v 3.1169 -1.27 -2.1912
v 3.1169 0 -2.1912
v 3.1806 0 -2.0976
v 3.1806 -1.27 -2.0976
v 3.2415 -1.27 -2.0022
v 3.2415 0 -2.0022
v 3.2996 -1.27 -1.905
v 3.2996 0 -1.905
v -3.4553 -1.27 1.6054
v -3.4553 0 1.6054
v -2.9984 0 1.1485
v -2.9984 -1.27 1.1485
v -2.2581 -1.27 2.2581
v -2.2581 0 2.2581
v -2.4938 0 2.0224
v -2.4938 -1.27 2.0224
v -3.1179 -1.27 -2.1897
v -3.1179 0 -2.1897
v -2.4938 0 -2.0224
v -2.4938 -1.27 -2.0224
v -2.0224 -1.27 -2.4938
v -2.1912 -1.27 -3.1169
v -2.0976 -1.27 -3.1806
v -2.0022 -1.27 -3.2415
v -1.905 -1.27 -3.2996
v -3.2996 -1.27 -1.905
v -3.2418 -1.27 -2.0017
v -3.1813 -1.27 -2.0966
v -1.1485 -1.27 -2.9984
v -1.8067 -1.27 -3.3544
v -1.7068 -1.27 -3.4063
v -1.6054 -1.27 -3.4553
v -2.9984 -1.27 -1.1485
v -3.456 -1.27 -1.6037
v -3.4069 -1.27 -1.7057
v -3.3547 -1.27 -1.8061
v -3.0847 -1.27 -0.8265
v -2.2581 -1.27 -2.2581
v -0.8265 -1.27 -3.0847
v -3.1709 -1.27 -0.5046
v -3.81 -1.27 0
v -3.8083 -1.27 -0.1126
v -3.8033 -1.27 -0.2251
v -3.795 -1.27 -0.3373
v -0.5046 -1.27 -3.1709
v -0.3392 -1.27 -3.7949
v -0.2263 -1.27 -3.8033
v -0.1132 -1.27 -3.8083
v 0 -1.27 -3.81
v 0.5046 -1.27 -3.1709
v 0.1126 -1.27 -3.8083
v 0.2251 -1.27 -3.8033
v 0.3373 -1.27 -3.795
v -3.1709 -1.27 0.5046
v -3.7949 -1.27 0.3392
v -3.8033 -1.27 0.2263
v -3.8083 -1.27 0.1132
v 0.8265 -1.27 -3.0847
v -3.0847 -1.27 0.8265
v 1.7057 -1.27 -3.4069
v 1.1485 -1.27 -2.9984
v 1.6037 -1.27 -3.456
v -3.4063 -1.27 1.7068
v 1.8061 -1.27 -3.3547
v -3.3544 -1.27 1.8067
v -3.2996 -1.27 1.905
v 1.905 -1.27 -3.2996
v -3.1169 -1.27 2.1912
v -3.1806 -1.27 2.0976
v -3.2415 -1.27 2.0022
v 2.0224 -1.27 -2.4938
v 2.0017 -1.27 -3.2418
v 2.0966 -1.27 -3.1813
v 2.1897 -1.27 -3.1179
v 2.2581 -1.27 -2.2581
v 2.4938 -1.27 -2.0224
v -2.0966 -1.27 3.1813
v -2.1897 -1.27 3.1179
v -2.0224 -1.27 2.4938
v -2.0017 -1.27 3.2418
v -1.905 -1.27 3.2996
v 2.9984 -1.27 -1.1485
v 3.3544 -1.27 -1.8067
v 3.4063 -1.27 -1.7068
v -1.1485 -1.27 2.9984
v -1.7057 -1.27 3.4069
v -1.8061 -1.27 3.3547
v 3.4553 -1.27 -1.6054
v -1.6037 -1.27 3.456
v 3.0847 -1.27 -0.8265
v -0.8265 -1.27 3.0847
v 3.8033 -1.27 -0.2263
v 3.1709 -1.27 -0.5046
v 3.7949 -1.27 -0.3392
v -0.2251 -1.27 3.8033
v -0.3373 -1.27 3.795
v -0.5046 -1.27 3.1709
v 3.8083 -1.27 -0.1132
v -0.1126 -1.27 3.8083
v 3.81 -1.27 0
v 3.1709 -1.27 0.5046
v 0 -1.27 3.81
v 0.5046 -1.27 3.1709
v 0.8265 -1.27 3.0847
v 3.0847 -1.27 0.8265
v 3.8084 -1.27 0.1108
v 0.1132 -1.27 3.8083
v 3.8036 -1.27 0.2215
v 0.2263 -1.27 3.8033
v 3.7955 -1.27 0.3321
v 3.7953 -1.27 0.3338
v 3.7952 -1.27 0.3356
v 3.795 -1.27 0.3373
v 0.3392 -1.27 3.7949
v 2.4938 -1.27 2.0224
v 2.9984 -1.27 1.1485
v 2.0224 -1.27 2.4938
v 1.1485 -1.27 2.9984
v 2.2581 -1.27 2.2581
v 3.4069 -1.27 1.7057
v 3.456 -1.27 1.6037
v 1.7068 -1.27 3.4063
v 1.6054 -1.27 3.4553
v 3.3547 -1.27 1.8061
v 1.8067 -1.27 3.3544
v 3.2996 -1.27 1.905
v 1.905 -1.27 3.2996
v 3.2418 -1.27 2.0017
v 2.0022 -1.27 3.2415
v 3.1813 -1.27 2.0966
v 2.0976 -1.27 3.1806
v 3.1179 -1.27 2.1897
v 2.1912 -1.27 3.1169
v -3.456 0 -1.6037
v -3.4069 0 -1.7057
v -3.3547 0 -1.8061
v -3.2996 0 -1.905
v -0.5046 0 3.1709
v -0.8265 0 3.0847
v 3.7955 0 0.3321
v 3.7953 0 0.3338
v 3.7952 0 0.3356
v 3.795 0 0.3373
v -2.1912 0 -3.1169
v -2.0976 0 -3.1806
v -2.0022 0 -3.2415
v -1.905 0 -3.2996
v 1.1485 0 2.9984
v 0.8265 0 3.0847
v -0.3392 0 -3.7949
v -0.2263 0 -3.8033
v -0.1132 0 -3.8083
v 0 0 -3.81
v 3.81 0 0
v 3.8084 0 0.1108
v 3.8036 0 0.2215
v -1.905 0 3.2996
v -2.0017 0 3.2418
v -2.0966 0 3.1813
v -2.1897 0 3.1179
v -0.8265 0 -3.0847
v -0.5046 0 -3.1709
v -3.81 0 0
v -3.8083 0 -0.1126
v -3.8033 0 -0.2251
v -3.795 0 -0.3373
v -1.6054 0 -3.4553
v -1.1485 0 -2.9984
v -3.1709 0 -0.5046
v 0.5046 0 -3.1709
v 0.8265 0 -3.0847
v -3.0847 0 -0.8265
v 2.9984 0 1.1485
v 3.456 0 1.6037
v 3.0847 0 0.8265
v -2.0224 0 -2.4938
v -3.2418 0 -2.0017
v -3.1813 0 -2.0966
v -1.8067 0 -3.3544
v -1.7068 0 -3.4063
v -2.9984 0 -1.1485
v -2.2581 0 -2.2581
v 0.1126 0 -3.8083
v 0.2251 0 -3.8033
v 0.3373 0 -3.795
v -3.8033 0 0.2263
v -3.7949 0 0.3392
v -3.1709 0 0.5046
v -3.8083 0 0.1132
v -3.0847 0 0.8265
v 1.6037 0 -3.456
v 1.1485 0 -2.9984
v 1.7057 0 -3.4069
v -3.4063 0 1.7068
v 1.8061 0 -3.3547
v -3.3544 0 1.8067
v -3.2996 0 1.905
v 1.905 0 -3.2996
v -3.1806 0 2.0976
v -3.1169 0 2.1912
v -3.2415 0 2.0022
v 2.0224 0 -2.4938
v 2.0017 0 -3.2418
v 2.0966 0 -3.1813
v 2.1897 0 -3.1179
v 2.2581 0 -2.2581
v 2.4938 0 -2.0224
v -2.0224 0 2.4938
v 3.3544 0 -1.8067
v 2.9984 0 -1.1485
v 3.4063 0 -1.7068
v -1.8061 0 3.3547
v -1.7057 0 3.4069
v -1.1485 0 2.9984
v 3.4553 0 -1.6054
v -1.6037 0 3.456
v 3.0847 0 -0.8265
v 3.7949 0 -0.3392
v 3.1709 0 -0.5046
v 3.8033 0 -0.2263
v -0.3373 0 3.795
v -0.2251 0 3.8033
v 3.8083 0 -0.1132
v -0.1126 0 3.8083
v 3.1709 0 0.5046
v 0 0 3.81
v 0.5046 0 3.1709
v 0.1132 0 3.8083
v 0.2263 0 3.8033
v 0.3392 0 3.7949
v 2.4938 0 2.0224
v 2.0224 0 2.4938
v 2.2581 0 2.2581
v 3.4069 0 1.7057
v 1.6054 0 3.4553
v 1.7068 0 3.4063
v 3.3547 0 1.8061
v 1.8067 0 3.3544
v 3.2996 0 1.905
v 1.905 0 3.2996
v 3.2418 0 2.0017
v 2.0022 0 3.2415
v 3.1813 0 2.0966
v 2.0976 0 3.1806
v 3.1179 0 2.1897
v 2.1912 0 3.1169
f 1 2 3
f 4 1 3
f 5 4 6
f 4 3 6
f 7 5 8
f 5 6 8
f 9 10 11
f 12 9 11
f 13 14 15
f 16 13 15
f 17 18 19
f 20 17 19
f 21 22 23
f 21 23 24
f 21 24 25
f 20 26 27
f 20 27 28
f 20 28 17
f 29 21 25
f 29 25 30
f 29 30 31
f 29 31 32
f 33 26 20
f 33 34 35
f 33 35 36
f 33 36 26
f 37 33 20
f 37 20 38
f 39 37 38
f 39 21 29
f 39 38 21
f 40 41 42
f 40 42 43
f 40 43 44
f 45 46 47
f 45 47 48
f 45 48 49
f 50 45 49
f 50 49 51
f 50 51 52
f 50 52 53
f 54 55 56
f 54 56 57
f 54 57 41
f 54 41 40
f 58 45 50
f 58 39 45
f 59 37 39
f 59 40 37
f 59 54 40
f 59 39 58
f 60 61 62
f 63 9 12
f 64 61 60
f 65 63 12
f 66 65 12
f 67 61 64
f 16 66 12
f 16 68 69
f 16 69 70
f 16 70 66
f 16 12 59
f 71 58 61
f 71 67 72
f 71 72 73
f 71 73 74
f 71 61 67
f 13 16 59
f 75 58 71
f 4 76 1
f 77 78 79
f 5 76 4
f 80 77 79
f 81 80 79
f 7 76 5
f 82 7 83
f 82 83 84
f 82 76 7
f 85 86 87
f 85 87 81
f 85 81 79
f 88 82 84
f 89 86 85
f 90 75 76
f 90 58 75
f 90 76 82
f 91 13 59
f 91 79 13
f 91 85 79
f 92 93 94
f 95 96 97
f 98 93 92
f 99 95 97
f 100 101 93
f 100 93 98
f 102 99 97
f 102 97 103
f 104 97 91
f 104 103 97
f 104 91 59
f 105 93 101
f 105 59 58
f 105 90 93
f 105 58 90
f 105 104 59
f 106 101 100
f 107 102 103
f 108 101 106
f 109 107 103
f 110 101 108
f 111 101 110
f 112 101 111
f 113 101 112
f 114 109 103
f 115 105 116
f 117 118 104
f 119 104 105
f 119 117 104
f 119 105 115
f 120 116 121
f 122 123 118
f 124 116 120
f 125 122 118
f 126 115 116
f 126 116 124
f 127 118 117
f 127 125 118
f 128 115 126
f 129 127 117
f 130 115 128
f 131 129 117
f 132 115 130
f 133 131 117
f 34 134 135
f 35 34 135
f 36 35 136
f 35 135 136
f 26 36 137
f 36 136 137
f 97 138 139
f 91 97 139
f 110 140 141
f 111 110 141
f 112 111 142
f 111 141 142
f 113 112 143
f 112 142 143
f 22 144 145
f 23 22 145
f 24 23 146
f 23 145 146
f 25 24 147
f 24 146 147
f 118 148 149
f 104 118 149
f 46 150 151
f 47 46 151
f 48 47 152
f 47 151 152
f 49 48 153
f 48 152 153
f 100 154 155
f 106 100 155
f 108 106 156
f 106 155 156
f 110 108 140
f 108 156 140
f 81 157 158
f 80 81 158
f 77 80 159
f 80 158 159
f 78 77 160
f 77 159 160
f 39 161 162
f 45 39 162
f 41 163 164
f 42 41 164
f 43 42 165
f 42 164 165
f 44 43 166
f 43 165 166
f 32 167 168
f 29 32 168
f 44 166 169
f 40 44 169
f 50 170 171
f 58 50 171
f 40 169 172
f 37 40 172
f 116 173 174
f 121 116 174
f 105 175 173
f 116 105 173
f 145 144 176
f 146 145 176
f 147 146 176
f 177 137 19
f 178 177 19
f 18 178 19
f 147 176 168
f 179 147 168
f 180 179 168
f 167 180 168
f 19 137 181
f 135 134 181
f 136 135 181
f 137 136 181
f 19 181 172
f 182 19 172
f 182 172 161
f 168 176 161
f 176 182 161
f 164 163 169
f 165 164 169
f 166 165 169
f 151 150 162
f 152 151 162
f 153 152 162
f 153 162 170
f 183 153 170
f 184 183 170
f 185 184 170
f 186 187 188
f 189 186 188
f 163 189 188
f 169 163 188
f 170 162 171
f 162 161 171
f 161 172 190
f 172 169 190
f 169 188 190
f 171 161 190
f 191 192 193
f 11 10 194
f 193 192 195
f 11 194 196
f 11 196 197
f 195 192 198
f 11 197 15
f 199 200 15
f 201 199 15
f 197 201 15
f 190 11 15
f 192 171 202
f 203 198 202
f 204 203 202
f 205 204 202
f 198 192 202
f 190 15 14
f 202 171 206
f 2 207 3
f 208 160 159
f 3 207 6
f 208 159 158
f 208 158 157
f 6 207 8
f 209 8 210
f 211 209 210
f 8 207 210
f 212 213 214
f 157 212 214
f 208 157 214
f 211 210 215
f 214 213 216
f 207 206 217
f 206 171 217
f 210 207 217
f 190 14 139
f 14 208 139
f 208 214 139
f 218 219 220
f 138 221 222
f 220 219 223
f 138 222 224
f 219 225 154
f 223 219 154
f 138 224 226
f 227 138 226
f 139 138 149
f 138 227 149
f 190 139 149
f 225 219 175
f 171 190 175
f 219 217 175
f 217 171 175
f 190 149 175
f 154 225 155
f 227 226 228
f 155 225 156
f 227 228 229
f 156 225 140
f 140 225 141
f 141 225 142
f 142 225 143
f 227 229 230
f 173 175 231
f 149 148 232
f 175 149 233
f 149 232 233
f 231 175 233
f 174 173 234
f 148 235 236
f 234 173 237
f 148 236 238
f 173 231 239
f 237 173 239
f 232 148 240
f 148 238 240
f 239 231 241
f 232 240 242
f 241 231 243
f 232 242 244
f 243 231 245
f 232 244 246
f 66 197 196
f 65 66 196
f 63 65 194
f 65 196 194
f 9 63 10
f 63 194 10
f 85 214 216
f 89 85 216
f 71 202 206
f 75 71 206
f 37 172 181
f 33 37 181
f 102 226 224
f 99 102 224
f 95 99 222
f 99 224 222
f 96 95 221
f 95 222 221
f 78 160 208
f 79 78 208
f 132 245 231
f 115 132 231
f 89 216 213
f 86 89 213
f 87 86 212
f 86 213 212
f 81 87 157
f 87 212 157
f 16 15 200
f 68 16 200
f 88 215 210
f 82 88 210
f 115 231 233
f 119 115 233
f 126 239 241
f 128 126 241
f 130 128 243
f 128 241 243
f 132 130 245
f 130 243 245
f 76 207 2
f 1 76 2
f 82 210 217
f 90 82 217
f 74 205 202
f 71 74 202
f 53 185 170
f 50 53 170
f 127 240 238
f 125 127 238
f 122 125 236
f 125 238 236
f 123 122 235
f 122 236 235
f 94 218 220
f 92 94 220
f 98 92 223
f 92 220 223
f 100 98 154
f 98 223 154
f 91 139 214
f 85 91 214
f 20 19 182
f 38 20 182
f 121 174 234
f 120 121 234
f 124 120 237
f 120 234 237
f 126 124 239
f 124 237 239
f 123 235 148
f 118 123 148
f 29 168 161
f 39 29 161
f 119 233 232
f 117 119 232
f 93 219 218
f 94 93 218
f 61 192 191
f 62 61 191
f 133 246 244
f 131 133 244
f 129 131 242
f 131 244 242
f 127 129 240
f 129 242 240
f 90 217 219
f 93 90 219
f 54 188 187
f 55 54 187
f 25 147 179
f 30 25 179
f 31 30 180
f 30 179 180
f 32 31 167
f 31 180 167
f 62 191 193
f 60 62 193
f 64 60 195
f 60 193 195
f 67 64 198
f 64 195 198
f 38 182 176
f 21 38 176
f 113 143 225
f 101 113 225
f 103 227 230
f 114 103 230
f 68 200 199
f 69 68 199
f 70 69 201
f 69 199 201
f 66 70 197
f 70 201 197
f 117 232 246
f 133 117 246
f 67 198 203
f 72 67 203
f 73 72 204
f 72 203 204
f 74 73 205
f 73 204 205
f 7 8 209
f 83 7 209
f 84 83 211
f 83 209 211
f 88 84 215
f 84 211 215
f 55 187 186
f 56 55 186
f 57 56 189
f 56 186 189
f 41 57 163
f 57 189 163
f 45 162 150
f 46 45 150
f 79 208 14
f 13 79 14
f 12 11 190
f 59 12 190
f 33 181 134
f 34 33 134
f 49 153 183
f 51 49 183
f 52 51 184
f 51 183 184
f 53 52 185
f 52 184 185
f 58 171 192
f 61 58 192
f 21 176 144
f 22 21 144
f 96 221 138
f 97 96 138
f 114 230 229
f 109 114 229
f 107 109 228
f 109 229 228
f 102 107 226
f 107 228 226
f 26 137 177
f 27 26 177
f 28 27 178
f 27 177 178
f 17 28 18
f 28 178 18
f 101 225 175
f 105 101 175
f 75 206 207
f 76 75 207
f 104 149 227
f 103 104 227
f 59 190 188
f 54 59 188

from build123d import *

# Parameters (mm, degrees)
F1_DEPTH = 1.27


with BuildPart() as f1:
    # F0 (on Front) → F1 (new body)
    with BuildSketch(Plane.XZ):
        with BuildLine():
            ThreePointArc((3.794874, -0.339167), (3.806217, -0.169752), (3.81, 0))
            Line((3.81, 0), (0, 0))
            Line((0, 0), (3.084668, 0.826534))
            Line((3.084668, 0.826534), (2.998397, 1.148501))
            Line((2.998397, 1.148501), (3.456041, 1.603709))
            ThreePointArc((3.456041, 1.603709), (3.381156, 1.756098), (3.299557, 1.905))
            ThreePointArc((3.299557, 1.905), (3.211897, 2.049345), (3.117927, 2.189664))
            Line((3.117927, 2.189664), (2.493829, 2.022438))
            Line((2.493829, 2.022438), (2.258134, 2.258134))
            Line((2.258134, 2.258134), (2.022438, 2.493829))
            Line((2.022438, 2.493829), (2.191164, 3.116873))
            ThreePointArc((2.191164, 3.116873), (2.050118, 3.211404), (1.905, 3.299557))
            ThreePointArc((1.905, 3.299557), (1.756912, 3.380734), (1.605372, 3.455269))
            Line((1.605372, 3.455269), (1.148501, 2.998397))
            Line((1.148501, 2.998397), (0.826534, 3.084668))
            Line((0.826534, 3.084668), (0.504568, 3.170939))
            Line((0.504568, 3.170939), (0.339167, 3.794874))
            ThreePointArc((0.339167, 3.794874), (0.169752, 3.806217), (0, 3.81))
            ThreePointArc((0, 3.81), (-0.168837, 3.806257), (-0.337341, 3.795036))
            Line((-0.337341, 3.795036), (-0.504568, 3.170939))
            Line((-0.504568, 3.170939), (-0.826534, 3.084668))
            Line((-0.826534, 3.084668), (-1.148501, 2.998397))
            Line((-1.148501, 2.998397), (-1.603709, 3.456041))
            ThreePointArc((-1.603709, 3.456041), (-1.756098, 3.381156), (-1.905, 3.299557))
            ThreePointArc((-1.905, 3.299557), (-2.049345, 3.211897), (-2.189664, 3.117927))
            Line((-2.189664, 3.117927), (-2.022438, 2.493829))
            Line((-2.022438, 2.493829), (-2.258134, 2.258134))
            Line((-2.258134, 2.258134), (-2.493829, 2.022438))
            Line((-2.493829, 2.022438), (-3.116873, 2.191164))
            ThreePointArc((-3.116873, 2.191164), (-3.211404, 2.050118), (-3.299557, 1.905))
            ThreePointArc((-3.299557, 1.905), (-3.380734, 1.756912), (-3.455269, 1.605372))
            Line((-3.455269, 1.605372), (-2.998397, 1.148501))
            Line((-2.998397, 1.148501), (-3.084668, 0.826534))
            Line((-3.084668, 0.826534), (-3.170939, 0.504568))
            Line((-3.170939, 0.504568), (-3.794874, 0.339167))
            ThreePointArc((-3.794874, 0.339167), (-3.806217, 0.169752), (-3.81, 0))
            ThreePointArc((-3.81, 0), (-3.806257, -0.168837), (-3.795036, -0.337341))
            Line((-3.795036, -0.337341), (-3.170939, -0.504568))
            Line((-3.170939, -0.504568), (-3.084668, -0.826534))
            Line((-3.084668, -0.826534), (-2.998397, -1.148501))
            Line((-2.998397, -1.148501), (-3.456041, -1.603709))
            ThreePointArc((-3.456041, -1.603709), (-3.381156, -1.756098), (-3.299557, -1.905))
            ThreePointArc((-3.299557, -1.905), (-3.211897, -2.049345), (-3.117927, -2.189664))
            Line((-3.117927, -2.189664), (-2.493829, -2.022438))
            Line((-2.493829, -2.022438), (-2.258134, -2.258134))
            Line((-2.258134, -2.258134), (-2.022438, -2.493829))
            Line((-2.022438, -2.493829), (-2.191164, -3.116873))
            ThreePointArc((-2.191164, -3.116873), (-2.050118, -3.211404), (-1.905, -3.299557))
            ThreePointArc((-1.905, -3.299557), (-1.756912, -3.380734), (-1.605372, -3.455269))
            Line((-1.605372, -3.455269), (-1.148501, -2.998397))
            Line((-1.148501, -2.998397), (-0.826534, -3.084668))
            Line((-0.826534, -3.084668), (-0.504568, -3.170939))
            Line((-0.504568, -3.170939), (-0.339167, -3.794874))
            ThreePointArc((-0.339167, -3.794874), (-0.169752, -3.806217), (0, -3.81))
            ThreePointArc((0, -3.81), (0.168837, -3.806257), (0.337341, -3.795036))
            Line((0.337341, -3.795036), (0.504568, -3.170939))
            Line((0.504568, -3.170939), (0.826534, -3.084668))
            Line((0.826534, -3.084668), (1.148501, -2.998397))
            Line((1.148501, -2.998397), (1.603709, -3.456041))
            ThreePointArc((1.603709, -3.456041), (1.756098, -3.381156), (1.905, -3.299557))
            ThreePointArc((1.905, -3.299557), (2.049345, -3.211897), (2.189664, -3.117927))
            Line((2.189664, -3.117927), (2.022438, -2.493829))
            Line((2.022438, -2.493829), (2.258134, -2.258134))
            Line((2.258134, -2.258134), (2.493829, -2.022438))
            Line((2.493829, -2.022438), (3.116873, -2.191164))
            ThreePointArc((3.116873, -2.191164), (3.211404, -2.050118), (3.299557, -1.905))
            ThreePointArc((3.299557, -1.905), (3.380734, -1.756912), (3.455269, -1.605372))
            Line((3.455269, -1.605372), (2.998397, -1.148501))
            Line((2.998397, -1.148501), (3.084668, -0.826534))
            Line((3.084668, -0.826534), (3.170939, -0.504568))
            Line((3.170939, -0.504568), (3.794874, -0.339167))
        make_face()
        with BuildLine():
            Line((0, 0), (3.795502, 0.332063))
            ThreePointArc((3.795502, 0.332063), (3.79527, 0.334702), (3.795036, 0.337341))
            Line((3.795036, 0.337341), (3.170939, 0.504568))
            Line((3.170939, 0.504568), (3.084668, 0.826534))
            Line((3.084668, 0.826534), (0, 0))
        make_face()
        with BuildLine():
            Line((0, 0), (3.81, 0))
            ThreePointArc((3.81, 0), (3.806374, 0.16619), (3.795502, 0.332063))
            Line((3.795502, 0.332063), (0, 0))
        make_face()
    extrude(amount=F1_DEPTH)


solid = f1.part
